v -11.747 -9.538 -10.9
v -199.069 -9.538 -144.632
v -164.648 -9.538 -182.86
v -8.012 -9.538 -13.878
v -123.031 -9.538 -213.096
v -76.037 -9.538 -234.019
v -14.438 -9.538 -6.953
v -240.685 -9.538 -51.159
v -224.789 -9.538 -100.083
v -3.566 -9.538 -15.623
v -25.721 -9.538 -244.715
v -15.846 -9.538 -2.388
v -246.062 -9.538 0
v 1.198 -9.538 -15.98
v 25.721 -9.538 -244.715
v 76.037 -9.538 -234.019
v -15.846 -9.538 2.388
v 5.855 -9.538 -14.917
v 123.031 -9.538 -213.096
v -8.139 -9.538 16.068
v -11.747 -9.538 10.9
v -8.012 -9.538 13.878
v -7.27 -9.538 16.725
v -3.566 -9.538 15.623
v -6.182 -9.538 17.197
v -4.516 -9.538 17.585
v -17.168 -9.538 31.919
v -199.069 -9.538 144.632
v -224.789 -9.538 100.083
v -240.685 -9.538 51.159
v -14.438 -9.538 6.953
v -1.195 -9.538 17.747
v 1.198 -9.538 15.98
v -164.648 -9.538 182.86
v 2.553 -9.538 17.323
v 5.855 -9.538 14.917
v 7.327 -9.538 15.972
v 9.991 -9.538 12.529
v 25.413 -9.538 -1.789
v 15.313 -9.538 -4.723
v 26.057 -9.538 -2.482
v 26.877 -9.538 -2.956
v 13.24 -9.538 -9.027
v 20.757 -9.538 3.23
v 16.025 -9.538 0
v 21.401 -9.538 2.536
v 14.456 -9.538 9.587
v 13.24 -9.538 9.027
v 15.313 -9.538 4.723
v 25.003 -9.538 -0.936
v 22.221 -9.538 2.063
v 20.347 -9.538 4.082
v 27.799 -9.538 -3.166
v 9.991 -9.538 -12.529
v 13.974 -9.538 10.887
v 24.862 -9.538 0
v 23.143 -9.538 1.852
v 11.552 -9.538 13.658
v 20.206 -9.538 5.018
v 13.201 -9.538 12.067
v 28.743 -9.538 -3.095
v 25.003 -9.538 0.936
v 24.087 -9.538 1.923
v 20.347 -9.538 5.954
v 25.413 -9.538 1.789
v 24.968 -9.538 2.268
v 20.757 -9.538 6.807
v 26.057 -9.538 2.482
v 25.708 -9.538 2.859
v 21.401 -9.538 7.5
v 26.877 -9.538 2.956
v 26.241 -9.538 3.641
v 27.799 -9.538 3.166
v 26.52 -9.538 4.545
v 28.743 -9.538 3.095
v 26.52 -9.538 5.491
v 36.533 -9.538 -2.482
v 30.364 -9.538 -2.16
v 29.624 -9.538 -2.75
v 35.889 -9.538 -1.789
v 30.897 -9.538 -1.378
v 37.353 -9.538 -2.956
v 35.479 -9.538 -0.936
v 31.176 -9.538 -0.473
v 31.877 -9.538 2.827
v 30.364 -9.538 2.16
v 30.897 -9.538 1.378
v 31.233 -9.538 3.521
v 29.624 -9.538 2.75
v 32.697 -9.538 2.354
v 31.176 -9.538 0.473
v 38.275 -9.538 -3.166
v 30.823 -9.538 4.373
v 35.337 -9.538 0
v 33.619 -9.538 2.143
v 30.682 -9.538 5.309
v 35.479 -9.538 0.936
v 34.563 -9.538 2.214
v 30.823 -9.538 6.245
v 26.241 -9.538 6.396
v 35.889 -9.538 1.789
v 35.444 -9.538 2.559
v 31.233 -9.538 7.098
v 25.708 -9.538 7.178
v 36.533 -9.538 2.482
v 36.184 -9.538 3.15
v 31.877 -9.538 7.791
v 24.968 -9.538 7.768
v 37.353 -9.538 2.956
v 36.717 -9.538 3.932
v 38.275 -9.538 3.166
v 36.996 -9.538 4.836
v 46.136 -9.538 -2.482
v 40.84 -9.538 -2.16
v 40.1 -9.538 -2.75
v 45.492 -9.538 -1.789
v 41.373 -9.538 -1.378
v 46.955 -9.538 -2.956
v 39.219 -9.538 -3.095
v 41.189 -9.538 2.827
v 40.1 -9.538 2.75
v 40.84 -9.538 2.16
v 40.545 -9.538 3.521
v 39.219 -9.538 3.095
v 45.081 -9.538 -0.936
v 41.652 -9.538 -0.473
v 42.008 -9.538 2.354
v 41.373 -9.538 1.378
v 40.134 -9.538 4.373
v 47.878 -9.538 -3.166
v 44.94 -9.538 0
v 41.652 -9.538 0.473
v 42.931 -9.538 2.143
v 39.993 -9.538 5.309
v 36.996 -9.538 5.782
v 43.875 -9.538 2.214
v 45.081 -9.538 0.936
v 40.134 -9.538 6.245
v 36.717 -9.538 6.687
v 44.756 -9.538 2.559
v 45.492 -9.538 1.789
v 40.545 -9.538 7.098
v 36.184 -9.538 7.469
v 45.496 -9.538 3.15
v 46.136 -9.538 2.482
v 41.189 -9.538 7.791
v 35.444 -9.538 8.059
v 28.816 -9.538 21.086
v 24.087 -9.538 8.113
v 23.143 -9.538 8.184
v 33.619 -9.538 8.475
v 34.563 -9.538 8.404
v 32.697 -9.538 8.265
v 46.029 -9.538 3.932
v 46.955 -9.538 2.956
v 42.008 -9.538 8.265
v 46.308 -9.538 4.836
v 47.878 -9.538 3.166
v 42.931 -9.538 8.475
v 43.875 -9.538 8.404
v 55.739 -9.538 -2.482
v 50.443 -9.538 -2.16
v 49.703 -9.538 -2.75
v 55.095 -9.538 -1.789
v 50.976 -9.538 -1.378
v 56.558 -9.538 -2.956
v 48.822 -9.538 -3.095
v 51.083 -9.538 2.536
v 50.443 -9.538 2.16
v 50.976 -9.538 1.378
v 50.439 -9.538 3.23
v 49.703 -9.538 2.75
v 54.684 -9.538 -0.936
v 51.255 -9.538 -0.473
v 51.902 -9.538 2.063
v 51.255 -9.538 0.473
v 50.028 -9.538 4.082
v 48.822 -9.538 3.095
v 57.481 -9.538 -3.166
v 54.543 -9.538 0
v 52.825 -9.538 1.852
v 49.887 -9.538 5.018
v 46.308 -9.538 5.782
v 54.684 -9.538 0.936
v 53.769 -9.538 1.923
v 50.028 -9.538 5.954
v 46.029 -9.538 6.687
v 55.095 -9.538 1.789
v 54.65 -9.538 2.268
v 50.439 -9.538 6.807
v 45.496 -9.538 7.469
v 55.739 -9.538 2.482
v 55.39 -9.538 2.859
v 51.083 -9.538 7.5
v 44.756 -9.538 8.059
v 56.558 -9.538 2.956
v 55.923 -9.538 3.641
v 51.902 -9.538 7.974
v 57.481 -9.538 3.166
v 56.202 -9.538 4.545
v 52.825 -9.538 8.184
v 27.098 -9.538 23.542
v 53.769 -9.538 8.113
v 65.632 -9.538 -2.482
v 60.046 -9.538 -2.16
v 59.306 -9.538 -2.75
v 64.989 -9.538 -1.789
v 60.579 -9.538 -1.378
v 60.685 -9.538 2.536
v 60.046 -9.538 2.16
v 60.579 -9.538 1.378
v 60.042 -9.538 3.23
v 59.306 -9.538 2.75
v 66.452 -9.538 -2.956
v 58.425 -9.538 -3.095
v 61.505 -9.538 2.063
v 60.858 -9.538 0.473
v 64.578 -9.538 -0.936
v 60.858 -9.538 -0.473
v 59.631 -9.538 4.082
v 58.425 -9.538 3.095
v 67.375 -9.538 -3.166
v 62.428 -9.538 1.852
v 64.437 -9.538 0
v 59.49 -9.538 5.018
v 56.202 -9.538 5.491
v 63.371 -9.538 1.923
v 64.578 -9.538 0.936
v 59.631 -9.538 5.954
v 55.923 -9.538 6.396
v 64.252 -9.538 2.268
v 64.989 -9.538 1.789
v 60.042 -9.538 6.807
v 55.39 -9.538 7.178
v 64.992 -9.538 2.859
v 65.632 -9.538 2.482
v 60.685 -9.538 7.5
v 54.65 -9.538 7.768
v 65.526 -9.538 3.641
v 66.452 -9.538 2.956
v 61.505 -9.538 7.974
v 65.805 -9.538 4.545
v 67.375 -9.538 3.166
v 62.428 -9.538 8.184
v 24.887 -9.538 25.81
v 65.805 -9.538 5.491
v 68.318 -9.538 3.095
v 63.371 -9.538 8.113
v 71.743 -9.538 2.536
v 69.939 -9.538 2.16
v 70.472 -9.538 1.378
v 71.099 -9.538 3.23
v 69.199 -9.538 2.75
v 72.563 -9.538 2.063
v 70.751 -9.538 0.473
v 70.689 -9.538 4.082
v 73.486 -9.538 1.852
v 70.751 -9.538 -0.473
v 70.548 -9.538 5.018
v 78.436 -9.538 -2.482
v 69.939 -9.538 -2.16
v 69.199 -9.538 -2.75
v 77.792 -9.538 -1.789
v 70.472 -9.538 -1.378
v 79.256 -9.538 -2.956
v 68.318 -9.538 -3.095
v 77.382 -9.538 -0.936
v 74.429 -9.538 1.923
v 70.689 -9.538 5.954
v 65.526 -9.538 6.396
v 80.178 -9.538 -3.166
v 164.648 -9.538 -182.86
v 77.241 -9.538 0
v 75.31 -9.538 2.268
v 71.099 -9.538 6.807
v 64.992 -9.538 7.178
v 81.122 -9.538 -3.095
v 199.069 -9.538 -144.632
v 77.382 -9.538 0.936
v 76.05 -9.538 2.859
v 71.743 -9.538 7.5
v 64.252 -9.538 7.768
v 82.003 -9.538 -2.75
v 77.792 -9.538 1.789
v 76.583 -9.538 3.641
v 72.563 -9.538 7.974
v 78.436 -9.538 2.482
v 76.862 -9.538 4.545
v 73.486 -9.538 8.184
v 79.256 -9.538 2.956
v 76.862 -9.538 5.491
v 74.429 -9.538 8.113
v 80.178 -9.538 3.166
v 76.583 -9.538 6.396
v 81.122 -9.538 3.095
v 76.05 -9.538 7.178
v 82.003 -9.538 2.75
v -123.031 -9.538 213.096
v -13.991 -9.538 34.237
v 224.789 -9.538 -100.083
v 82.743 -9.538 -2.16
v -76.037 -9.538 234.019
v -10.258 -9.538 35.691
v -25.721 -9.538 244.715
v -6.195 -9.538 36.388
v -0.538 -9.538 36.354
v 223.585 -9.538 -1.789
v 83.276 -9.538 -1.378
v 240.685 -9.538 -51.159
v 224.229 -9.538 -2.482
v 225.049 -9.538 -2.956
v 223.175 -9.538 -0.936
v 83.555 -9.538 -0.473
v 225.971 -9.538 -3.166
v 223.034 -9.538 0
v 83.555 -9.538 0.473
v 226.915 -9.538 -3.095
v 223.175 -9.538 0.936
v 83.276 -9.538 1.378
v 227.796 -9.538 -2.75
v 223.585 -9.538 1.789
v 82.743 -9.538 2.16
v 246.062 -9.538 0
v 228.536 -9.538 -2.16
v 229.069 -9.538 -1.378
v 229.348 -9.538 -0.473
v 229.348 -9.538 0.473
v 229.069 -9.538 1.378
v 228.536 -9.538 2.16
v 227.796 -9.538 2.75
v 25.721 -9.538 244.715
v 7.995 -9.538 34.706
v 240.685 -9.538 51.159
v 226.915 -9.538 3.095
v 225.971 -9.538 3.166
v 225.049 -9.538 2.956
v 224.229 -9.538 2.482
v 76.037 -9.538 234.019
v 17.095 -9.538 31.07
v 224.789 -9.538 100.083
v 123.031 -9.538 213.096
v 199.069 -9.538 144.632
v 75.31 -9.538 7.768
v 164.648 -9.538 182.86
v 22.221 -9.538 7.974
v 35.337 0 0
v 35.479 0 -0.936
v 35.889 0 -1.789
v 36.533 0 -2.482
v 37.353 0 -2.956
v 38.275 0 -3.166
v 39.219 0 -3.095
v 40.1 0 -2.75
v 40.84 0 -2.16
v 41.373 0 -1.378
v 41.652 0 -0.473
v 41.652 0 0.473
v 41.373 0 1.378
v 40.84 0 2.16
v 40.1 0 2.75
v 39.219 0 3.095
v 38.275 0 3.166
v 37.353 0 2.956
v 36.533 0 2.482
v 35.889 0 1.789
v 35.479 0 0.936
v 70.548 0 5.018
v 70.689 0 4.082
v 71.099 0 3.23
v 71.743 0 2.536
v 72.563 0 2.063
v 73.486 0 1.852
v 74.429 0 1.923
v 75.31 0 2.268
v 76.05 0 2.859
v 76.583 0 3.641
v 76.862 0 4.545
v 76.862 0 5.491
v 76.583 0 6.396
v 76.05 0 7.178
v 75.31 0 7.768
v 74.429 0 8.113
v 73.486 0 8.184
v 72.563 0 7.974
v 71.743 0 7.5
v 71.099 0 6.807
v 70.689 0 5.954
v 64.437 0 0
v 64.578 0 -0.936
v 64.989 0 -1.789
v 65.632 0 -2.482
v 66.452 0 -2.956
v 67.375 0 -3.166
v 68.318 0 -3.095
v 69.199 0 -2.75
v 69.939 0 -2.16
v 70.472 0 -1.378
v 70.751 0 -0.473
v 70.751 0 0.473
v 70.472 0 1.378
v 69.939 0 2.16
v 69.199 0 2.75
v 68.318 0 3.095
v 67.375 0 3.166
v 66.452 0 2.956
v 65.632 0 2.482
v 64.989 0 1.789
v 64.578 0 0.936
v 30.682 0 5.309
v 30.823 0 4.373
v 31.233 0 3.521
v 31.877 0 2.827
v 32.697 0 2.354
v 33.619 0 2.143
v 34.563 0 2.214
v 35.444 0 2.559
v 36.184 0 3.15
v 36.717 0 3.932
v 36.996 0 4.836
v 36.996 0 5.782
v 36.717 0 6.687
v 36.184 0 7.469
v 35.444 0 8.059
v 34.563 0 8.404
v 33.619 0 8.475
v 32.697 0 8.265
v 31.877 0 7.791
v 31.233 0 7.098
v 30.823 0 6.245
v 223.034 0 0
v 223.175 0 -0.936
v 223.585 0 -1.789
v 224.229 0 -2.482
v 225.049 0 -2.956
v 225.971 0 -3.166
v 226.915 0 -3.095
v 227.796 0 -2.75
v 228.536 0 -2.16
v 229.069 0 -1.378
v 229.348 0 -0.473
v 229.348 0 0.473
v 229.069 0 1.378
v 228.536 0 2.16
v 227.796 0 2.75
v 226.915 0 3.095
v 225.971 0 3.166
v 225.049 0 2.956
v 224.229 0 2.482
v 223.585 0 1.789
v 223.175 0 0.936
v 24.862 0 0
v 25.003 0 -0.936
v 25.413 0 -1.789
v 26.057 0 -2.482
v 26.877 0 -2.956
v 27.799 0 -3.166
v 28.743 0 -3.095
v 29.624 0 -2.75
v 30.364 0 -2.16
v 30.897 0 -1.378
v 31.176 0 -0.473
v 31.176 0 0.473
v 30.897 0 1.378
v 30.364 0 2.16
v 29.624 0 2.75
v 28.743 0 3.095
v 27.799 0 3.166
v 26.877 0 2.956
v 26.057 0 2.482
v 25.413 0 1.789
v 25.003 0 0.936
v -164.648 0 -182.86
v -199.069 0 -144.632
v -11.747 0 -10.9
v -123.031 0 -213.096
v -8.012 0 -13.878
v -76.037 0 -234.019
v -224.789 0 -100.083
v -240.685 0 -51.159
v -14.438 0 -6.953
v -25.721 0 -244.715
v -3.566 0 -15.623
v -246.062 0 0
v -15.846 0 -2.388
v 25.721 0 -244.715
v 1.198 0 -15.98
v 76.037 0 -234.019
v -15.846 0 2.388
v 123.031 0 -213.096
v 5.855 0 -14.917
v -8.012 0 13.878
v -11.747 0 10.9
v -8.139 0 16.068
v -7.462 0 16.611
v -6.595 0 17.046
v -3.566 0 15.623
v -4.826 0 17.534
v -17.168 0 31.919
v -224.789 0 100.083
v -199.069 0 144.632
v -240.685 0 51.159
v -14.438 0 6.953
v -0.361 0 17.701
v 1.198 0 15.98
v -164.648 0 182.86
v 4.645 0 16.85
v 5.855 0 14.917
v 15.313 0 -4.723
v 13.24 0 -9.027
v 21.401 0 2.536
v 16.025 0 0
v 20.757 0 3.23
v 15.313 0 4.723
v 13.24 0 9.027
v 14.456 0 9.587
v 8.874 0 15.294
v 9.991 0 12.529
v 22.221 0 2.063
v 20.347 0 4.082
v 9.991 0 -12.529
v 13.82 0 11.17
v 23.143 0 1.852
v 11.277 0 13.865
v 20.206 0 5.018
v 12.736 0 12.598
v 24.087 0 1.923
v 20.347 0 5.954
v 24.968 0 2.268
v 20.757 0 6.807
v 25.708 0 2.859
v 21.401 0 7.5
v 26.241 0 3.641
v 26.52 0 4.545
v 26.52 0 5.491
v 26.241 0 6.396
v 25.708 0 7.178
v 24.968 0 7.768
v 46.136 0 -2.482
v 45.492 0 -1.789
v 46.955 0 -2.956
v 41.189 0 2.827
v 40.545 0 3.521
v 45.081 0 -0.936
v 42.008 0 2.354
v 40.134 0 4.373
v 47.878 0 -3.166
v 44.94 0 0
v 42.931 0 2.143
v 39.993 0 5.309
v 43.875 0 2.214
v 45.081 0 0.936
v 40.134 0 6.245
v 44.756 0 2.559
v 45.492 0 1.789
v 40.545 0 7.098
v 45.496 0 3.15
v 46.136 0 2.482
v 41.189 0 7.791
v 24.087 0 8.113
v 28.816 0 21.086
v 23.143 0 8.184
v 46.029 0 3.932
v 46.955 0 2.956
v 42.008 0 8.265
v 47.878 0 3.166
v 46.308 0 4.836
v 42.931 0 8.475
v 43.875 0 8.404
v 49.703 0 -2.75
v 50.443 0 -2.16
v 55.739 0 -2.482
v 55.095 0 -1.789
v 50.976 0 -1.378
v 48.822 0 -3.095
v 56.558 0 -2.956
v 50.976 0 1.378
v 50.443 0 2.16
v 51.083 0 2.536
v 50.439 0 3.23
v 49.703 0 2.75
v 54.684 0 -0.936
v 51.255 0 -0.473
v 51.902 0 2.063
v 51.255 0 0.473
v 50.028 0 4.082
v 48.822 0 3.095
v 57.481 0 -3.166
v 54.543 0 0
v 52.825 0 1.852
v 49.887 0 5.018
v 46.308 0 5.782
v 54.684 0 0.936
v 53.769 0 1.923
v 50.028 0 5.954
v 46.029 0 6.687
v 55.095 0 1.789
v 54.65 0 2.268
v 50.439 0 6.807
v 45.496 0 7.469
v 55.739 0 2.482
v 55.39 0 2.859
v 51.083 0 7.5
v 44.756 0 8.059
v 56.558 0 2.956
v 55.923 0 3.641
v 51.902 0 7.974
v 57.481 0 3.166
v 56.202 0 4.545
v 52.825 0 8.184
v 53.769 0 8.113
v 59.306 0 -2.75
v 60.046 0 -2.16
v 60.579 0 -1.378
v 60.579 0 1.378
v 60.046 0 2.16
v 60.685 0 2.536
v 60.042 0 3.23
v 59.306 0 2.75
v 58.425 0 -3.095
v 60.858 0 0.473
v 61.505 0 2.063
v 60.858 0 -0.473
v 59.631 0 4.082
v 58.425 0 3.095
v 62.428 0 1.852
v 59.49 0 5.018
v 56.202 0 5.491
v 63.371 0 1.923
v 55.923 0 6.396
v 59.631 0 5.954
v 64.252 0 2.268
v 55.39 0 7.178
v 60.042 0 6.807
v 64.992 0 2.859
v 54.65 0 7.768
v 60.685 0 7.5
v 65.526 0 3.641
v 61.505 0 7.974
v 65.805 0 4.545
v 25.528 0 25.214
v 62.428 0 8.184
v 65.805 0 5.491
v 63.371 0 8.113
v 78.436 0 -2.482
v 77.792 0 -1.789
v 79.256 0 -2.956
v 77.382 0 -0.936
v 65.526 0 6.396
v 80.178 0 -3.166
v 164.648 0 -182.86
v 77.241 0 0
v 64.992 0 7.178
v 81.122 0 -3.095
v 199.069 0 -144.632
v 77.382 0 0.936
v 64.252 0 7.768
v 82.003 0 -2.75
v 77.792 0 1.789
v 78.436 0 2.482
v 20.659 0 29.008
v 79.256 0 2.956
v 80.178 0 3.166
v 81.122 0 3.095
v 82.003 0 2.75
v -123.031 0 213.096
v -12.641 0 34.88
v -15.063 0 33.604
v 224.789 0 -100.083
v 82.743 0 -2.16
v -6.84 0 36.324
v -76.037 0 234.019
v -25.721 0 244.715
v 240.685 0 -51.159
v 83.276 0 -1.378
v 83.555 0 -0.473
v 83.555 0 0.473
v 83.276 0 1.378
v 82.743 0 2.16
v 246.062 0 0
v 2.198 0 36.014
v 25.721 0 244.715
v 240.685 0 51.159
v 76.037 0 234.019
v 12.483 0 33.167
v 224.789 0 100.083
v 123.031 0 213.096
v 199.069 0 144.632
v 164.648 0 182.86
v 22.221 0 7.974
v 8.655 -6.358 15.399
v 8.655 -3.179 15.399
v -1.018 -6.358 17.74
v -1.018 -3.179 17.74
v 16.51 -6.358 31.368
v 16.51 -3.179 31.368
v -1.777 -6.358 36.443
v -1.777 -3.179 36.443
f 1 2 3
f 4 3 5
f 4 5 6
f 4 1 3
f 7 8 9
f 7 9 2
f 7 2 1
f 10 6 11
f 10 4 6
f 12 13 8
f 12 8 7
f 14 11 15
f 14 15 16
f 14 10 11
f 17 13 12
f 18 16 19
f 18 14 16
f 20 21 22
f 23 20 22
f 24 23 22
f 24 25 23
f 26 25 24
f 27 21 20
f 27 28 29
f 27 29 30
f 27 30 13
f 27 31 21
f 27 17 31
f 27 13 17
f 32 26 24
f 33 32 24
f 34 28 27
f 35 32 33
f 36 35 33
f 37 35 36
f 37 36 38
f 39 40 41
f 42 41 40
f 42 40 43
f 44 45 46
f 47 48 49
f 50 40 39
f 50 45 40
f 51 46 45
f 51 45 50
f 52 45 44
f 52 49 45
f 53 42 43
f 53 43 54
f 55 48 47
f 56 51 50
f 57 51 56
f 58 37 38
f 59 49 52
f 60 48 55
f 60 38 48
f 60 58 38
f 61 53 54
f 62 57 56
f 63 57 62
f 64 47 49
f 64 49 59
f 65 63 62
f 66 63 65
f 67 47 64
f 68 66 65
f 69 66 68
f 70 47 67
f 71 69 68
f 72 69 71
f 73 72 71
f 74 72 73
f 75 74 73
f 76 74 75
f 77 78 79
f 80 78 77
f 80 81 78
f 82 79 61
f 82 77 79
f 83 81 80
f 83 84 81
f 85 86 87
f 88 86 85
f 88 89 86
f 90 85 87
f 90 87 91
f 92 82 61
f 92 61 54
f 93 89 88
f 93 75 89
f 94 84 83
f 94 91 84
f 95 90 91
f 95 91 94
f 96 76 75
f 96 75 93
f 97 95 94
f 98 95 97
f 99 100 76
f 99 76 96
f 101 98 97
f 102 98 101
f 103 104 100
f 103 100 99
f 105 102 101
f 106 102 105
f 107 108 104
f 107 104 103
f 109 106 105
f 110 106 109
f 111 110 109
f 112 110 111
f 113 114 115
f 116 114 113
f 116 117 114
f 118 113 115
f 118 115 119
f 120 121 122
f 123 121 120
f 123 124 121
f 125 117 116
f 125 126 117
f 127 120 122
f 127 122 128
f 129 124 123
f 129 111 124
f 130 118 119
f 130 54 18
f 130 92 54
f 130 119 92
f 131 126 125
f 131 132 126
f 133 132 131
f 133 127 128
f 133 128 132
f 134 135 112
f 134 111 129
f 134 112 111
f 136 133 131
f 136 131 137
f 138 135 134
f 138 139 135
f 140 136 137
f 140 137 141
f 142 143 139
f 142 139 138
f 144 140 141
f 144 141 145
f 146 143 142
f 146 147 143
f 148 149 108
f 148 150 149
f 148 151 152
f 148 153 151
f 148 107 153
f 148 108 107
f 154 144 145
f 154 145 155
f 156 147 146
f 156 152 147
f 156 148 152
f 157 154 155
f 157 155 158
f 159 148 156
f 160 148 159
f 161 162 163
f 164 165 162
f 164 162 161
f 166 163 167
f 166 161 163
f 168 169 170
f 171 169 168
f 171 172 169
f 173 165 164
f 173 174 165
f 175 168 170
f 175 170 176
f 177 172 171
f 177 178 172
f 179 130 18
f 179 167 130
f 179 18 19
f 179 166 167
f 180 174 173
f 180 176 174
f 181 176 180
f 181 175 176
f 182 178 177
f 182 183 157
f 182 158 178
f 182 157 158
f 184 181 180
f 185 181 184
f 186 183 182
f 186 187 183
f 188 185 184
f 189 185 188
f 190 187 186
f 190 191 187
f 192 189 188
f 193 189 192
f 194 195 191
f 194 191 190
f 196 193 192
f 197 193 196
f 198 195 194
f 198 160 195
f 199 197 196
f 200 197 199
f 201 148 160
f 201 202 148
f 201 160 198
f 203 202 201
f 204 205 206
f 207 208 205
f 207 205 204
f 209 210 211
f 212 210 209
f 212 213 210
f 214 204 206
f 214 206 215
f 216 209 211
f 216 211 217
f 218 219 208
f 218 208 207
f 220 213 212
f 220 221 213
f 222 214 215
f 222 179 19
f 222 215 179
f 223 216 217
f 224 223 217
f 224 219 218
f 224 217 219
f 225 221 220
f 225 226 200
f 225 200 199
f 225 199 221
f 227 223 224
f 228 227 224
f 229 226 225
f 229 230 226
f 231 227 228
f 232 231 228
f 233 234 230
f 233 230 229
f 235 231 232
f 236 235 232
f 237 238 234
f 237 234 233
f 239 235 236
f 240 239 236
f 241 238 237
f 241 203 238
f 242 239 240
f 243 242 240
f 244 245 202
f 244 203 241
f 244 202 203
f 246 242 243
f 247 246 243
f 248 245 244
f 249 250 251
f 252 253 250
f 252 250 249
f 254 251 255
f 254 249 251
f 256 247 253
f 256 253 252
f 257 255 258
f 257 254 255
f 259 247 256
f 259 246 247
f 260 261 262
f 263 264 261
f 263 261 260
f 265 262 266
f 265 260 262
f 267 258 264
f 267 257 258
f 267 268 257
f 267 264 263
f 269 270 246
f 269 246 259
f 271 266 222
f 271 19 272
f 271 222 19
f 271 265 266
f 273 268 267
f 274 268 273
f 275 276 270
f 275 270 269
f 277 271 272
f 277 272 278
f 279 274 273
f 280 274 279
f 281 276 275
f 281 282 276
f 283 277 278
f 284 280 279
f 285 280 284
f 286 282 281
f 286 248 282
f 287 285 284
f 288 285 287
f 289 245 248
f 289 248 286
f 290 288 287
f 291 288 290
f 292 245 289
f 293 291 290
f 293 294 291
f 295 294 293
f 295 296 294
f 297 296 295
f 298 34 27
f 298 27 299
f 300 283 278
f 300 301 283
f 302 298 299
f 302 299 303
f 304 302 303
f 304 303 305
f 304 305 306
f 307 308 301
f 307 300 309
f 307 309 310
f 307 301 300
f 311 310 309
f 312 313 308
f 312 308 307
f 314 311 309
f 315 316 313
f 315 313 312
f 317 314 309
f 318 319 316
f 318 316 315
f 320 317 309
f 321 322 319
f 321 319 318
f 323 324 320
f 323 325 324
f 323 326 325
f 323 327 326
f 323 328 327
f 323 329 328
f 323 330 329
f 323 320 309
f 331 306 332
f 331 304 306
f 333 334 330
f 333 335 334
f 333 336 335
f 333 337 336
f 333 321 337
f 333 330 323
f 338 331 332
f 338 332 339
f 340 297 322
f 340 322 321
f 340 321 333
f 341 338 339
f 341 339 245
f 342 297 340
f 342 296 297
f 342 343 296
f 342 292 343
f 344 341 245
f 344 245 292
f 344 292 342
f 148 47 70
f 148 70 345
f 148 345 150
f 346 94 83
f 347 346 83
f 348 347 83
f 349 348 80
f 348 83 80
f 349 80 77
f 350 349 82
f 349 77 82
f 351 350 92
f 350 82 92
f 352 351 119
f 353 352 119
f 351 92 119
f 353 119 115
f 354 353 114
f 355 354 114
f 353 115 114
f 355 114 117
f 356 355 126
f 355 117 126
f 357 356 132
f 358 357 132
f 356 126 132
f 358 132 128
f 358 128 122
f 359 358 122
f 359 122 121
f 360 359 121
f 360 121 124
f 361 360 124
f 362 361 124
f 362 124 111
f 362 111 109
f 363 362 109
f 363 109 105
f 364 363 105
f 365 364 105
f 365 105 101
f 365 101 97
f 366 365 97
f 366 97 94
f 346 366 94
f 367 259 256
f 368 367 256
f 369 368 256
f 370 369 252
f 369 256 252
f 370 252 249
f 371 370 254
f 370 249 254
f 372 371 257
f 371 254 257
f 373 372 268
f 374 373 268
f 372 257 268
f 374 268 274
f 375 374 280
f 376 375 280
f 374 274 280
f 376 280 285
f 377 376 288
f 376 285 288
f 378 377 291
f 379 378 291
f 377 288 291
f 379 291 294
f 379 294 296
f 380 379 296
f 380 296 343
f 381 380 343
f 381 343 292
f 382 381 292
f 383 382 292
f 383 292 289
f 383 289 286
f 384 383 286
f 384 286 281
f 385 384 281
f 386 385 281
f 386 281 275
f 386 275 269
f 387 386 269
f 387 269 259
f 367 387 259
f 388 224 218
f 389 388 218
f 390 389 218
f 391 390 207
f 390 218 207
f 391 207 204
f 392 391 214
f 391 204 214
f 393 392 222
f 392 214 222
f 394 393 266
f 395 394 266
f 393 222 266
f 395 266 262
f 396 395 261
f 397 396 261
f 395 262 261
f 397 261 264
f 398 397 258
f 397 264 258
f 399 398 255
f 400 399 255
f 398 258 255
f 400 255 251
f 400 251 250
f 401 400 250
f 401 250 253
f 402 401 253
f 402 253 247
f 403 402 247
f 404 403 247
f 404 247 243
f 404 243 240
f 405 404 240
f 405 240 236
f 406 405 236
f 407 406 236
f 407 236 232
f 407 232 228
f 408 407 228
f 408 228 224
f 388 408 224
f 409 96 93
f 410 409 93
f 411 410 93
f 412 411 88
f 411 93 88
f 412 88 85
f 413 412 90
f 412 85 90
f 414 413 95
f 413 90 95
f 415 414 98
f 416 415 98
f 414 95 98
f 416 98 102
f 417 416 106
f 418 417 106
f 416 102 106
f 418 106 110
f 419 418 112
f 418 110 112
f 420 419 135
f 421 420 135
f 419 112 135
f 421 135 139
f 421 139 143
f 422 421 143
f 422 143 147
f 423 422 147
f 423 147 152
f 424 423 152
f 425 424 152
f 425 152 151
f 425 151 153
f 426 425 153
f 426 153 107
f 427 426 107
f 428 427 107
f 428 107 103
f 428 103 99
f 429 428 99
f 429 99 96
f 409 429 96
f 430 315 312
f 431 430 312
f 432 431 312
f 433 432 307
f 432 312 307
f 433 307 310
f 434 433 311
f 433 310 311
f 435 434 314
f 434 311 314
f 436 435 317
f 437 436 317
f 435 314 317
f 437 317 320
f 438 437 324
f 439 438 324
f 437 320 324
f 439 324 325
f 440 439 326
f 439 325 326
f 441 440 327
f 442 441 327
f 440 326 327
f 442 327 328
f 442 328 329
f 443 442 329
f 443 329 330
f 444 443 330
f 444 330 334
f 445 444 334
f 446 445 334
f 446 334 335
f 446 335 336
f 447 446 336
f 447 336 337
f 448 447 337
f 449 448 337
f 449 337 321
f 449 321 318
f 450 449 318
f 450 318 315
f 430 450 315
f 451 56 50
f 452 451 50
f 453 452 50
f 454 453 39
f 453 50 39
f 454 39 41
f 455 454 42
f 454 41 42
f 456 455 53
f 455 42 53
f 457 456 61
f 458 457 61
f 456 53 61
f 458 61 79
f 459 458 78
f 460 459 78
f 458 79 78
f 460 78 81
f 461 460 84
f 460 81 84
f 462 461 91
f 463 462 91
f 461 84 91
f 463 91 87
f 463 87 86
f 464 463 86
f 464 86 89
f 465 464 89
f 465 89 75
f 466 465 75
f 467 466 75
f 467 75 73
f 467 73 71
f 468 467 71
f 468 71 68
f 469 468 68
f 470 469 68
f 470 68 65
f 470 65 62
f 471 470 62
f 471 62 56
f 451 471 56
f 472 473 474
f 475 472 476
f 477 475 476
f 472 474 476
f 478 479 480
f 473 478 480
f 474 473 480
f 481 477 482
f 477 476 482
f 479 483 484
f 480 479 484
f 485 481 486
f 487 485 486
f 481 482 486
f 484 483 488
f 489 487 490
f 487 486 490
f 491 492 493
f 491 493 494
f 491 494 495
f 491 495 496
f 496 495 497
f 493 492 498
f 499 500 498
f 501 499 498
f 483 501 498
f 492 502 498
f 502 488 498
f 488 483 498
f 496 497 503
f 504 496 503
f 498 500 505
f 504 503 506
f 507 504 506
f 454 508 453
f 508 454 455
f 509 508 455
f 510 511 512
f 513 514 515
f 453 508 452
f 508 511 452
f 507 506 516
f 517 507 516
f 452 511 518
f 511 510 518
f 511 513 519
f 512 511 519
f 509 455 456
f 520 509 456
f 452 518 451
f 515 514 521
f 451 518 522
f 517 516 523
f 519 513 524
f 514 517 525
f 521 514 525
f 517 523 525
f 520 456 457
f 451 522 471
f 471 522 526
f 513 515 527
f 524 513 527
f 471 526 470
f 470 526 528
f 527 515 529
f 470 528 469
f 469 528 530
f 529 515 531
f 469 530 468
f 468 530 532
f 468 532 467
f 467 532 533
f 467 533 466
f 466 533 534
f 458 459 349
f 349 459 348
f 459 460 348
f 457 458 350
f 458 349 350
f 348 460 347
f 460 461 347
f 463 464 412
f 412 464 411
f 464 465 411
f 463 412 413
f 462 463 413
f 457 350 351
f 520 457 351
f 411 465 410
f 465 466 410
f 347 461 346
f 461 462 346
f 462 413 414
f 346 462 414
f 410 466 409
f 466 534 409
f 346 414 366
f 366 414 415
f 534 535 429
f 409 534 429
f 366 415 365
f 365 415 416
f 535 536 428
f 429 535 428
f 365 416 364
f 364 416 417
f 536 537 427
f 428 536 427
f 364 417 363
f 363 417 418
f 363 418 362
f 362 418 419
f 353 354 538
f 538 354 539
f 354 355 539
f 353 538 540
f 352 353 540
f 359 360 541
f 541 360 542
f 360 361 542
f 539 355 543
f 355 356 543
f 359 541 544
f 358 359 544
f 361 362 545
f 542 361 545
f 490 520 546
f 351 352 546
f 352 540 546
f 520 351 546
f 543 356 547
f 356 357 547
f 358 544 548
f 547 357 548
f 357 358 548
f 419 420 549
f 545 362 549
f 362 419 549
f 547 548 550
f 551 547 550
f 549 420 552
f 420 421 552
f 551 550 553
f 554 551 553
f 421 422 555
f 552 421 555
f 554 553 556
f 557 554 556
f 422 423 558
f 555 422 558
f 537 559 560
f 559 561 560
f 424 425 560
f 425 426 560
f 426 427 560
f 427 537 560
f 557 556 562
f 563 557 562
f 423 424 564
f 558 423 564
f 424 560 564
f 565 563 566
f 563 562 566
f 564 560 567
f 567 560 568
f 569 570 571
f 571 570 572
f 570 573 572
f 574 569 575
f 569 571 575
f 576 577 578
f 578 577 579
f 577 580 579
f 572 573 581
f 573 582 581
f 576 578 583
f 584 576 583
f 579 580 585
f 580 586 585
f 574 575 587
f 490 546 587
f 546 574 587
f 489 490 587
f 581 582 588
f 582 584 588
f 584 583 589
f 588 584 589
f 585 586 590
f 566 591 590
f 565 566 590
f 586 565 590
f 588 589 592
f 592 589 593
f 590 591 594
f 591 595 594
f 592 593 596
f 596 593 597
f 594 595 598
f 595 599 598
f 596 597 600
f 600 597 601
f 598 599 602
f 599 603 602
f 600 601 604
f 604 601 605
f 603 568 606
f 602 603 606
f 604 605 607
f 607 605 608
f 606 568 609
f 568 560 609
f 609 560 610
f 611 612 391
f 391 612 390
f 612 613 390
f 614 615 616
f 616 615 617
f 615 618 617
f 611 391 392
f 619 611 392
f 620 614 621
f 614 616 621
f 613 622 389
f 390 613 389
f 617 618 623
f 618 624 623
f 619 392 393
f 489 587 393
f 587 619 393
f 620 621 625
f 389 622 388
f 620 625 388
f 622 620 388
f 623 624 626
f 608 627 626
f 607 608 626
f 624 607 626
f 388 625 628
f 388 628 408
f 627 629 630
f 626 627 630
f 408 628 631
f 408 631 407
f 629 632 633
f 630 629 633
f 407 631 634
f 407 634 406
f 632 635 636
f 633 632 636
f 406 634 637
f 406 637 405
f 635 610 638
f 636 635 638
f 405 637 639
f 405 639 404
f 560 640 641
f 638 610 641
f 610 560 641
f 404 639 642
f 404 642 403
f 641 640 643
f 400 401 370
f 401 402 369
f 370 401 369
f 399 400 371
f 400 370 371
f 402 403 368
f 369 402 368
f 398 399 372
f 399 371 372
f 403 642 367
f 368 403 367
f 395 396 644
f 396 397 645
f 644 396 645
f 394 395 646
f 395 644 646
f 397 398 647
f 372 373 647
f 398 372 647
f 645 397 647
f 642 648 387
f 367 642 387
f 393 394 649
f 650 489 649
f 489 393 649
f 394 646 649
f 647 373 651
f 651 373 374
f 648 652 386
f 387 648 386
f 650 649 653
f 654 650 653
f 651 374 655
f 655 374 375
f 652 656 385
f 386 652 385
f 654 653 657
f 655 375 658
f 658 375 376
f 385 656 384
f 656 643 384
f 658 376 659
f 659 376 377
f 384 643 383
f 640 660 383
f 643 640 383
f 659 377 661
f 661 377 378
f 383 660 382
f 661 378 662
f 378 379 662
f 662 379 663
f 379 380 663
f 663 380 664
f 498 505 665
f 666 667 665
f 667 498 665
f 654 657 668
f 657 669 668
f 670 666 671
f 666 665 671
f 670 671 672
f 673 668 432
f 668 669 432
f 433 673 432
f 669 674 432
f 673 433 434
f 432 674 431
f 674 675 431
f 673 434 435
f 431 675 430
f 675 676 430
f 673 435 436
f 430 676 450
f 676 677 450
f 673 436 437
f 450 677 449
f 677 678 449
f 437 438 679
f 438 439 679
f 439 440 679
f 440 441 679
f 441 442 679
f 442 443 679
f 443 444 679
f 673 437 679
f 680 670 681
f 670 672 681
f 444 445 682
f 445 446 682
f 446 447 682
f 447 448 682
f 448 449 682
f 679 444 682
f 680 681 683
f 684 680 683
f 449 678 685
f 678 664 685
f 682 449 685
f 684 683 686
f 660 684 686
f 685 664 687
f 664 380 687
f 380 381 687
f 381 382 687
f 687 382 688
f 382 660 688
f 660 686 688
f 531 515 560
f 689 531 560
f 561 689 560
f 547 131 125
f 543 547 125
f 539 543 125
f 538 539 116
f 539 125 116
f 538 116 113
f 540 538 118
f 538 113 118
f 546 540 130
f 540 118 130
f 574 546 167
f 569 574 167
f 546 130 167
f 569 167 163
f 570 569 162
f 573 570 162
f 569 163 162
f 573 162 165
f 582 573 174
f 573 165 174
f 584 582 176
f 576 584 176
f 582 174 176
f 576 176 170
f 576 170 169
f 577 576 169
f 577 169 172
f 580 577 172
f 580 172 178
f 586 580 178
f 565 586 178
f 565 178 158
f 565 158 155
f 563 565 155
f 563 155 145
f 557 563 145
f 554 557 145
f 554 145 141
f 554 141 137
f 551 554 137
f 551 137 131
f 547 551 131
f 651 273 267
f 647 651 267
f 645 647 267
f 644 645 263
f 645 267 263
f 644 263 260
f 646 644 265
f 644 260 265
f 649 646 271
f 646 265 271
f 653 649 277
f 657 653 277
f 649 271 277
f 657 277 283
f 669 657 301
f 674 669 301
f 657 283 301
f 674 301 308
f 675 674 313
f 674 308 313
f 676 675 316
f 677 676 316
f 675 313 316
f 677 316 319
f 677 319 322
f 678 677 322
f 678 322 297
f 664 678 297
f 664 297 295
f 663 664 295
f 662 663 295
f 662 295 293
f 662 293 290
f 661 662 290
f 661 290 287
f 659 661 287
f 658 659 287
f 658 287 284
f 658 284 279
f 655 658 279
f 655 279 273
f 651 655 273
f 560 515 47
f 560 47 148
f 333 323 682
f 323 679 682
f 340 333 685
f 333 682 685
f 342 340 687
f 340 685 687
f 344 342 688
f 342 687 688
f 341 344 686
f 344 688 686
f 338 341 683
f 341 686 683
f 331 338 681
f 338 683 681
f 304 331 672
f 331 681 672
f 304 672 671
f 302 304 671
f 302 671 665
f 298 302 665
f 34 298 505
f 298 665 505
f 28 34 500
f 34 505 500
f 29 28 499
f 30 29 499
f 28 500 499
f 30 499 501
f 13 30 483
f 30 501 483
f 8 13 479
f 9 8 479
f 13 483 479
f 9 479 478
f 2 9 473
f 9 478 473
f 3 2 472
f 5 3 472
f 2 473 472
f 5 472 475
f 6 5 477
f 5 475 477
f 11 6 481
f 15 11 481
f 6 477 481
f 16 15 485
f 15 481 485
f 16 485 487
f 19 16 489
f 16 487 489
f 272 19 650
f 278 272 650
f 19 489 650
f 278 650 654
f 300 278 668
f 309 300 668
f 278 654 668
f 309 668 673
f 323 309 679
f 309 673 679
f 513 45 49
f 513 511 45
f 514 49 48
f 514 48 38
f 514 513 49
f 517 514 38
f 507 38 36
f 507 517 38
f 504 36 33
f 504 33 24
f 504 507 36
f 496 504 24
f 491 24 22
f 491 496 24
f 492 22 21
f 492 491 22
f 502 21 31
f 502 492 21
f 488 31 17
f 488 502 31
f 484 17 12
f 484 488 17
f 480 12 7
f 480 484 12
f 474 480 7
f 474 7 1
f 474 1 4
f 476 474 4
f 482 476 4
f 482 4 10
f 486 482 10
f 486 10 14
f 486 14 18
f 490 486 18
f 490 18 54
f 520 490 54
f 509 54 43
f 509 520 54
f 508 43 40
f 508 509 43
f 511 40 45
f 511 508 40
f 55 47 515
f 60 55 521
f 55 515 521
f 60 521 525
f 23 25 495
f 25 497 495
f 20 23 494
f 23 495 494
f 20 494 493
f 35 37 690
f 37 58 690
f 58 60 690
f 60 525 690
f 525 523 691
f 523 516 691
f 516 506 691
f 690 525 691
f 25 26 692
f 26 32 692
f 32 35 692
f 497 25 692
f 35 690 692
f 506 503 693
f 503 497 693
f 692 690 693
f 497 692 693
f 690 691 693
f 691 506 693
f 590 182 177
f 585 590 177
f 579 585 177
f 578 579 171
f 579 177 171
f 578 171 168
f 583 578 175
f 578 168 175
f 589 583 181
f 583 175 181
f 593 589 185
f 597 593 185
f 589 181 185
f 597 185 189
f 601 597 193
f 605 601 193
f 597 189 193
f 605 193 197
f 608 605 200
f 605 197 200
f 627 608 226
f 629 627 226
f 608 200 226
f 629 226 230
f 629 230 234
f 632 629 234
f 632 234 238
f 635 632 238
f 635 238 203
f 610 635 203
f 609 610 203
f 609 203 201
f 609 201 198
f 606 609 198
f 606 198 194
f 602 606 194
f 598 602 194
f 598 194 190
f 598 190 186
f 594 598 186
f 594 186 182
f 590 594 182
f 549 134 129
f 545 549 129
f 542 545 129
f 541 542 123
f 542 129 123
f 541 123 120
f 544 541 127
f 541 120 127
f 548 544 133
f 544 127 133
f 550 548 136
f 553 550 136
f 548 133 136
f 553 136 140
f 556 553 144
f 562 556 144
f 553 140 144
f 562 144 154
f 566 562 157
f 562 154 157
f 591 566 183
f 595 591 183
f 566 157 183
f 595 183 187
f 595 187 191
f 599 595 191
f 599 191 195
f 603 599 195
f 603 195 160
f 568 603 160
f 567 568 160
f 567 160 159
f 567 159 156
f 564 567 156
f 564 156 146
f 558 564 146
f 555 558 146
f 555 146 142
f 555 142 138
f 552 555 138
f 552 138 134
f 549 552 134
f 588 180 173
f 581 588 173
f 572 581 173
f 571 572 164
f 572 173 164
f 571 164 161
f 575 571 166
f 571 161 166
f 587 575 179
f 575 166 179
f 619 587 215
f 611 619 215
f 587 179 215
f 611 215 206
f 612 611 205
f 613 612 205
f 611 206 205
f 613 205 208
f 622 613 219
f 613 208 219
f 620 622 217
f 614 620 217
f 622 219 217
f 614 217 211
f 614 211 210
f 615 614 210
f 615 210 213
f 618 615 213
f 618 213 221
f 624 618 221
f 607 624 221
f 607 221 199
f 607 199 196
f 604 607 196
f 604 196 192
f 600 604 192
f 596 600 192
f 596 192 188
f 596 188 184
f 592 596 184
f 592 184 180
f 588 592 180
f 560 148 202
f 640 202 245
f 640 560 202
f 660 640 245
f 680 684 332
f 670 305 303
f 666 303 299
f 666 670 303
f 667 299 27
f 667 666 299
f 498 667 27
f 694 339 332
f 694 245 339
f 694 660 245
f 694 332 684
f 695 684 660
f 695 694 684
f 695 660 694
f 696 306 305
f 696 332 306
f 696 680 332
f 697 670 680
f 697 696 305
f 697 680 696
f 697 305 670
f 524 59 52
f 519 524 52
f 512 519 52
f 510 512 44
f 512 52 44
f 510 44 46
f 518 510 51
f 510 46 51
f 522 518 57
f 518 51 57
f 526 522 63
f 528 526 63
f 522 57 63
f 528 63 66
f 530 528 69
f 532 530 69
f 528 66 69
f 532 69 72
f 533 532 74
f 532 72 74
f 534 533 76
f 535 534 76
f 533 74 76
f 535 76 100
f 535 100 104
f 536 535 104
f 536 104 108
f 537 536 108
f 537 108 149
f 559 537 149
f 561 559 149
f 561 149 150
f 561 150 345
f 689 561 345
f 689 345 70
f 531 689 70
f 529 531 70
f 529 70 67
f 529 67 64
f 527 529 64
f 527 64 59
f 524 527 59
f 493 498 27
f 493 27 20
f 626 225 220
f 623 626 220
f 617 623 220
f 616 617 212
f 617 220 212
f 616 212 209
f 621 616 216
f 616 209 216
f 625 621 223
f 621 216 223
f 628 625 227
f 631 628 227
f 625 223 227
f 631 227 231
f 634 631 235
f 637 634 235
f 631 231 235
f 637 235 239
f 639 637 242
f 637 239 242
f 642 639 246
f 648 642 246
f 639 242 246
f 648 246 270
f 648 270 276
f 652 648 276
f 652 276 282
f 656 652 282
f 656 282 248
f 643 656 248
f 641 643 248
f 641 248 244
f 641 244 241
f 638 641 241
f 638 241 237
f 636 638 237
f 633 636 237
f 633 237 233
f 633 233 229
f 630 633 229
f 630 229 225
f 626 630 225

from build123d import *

# Parameters (mm, degrees)
F0_R     = 246.0625
F0_R_2   = 16.0248299709
F1_DEPTH = 4.7625
F2_DEPTH = 4.7752
F4_D     = 6.35
F6_DEPTH = 9.5387
F8_D     = 6.35


with BuildPart() as f1:
    # F0 (on Front) → F1 (new body)
    with BuildSketch(Plane.XZ):
        Circle(F0_R)
        Circle(F0_R_2, mode=Mode.SUBTRACT)
    extrude(amount=F1_DEPTH)

    # F2 (add): a face of the model
    f2_faces = [f1.faces().sort_by_distance(p)[0] for p in [
        (-239.1028015062, -4.7625, 0),
    ]]
    extrude(f2_faces, amount=F2_DEPTH)

    # F4 (through all)
    with Locations(Plane(origin=(0, 0, 0), x_dir=(1, 0, 0), z_dir=(0, 1, 0))):
        with Locations((23.3807638288, -5.0180926919), (28.036672622, 0), (33.8565558195, -5.3090867586), (38.5124646127, 0), (43.1683734059, -5.3090867586), (48.1152758002, 0), (57.7180869877, 0), (62.6649931073, -5.0180926919), (67.611888051, 0), (73.7227723002, -5.0180926919), (53.0621781945, -5.0180926919), (80.415636301, 0)):
            Hole(F4_D / 2)

    # F5 (on Front) → F6 (cut, through all)
    with BuildSketch(Plane.XZ):
        with BuildLine():
            add(Edge.make_bspline(
                [(14.4555894658, 9.5869684592), (12.7334762365, 16.9557761401), (-4.4353525154, 19.925462082), (-8.1386631355, 16.0679295659)],
                knots=[0, 0, 0, 0, 23.5053846486, 23.5053846486, 23.5053846486, 23.5053846486], degree=3))
            Line((14.4555894658, 9.5869684592), (28.8158967792, 21.0863542243))
            add(Edge.make_bspline(
                [(28.8158967792, 21.0863542243), (22.4603216629, 32.5071383268), (-6.1850600177, 42.7067335695), (-17.1682926589, 31.9189709392)],
                knots=[0, 0, 0, 0, 47.2428964307, 47.2428964307, 47.2428964307, 47.2428964307], degree=3))
            Line((-17.1682926589, 31.9189709392), (-8.1386631355, 16.0679295659))
        make_face()
    extrude(amount=F6_DEPTH, mode=Mode.SUBTRACT)

    # F8 (through all)
    with Locations(Plane(origin=(0, 0, 0), x_dir=(1, 0, 0), z_dir=(0, 1, 0))):
        with Locations((226.2086173164, 0)):
            Hole(F8_D / 2)


solid = f1.part
